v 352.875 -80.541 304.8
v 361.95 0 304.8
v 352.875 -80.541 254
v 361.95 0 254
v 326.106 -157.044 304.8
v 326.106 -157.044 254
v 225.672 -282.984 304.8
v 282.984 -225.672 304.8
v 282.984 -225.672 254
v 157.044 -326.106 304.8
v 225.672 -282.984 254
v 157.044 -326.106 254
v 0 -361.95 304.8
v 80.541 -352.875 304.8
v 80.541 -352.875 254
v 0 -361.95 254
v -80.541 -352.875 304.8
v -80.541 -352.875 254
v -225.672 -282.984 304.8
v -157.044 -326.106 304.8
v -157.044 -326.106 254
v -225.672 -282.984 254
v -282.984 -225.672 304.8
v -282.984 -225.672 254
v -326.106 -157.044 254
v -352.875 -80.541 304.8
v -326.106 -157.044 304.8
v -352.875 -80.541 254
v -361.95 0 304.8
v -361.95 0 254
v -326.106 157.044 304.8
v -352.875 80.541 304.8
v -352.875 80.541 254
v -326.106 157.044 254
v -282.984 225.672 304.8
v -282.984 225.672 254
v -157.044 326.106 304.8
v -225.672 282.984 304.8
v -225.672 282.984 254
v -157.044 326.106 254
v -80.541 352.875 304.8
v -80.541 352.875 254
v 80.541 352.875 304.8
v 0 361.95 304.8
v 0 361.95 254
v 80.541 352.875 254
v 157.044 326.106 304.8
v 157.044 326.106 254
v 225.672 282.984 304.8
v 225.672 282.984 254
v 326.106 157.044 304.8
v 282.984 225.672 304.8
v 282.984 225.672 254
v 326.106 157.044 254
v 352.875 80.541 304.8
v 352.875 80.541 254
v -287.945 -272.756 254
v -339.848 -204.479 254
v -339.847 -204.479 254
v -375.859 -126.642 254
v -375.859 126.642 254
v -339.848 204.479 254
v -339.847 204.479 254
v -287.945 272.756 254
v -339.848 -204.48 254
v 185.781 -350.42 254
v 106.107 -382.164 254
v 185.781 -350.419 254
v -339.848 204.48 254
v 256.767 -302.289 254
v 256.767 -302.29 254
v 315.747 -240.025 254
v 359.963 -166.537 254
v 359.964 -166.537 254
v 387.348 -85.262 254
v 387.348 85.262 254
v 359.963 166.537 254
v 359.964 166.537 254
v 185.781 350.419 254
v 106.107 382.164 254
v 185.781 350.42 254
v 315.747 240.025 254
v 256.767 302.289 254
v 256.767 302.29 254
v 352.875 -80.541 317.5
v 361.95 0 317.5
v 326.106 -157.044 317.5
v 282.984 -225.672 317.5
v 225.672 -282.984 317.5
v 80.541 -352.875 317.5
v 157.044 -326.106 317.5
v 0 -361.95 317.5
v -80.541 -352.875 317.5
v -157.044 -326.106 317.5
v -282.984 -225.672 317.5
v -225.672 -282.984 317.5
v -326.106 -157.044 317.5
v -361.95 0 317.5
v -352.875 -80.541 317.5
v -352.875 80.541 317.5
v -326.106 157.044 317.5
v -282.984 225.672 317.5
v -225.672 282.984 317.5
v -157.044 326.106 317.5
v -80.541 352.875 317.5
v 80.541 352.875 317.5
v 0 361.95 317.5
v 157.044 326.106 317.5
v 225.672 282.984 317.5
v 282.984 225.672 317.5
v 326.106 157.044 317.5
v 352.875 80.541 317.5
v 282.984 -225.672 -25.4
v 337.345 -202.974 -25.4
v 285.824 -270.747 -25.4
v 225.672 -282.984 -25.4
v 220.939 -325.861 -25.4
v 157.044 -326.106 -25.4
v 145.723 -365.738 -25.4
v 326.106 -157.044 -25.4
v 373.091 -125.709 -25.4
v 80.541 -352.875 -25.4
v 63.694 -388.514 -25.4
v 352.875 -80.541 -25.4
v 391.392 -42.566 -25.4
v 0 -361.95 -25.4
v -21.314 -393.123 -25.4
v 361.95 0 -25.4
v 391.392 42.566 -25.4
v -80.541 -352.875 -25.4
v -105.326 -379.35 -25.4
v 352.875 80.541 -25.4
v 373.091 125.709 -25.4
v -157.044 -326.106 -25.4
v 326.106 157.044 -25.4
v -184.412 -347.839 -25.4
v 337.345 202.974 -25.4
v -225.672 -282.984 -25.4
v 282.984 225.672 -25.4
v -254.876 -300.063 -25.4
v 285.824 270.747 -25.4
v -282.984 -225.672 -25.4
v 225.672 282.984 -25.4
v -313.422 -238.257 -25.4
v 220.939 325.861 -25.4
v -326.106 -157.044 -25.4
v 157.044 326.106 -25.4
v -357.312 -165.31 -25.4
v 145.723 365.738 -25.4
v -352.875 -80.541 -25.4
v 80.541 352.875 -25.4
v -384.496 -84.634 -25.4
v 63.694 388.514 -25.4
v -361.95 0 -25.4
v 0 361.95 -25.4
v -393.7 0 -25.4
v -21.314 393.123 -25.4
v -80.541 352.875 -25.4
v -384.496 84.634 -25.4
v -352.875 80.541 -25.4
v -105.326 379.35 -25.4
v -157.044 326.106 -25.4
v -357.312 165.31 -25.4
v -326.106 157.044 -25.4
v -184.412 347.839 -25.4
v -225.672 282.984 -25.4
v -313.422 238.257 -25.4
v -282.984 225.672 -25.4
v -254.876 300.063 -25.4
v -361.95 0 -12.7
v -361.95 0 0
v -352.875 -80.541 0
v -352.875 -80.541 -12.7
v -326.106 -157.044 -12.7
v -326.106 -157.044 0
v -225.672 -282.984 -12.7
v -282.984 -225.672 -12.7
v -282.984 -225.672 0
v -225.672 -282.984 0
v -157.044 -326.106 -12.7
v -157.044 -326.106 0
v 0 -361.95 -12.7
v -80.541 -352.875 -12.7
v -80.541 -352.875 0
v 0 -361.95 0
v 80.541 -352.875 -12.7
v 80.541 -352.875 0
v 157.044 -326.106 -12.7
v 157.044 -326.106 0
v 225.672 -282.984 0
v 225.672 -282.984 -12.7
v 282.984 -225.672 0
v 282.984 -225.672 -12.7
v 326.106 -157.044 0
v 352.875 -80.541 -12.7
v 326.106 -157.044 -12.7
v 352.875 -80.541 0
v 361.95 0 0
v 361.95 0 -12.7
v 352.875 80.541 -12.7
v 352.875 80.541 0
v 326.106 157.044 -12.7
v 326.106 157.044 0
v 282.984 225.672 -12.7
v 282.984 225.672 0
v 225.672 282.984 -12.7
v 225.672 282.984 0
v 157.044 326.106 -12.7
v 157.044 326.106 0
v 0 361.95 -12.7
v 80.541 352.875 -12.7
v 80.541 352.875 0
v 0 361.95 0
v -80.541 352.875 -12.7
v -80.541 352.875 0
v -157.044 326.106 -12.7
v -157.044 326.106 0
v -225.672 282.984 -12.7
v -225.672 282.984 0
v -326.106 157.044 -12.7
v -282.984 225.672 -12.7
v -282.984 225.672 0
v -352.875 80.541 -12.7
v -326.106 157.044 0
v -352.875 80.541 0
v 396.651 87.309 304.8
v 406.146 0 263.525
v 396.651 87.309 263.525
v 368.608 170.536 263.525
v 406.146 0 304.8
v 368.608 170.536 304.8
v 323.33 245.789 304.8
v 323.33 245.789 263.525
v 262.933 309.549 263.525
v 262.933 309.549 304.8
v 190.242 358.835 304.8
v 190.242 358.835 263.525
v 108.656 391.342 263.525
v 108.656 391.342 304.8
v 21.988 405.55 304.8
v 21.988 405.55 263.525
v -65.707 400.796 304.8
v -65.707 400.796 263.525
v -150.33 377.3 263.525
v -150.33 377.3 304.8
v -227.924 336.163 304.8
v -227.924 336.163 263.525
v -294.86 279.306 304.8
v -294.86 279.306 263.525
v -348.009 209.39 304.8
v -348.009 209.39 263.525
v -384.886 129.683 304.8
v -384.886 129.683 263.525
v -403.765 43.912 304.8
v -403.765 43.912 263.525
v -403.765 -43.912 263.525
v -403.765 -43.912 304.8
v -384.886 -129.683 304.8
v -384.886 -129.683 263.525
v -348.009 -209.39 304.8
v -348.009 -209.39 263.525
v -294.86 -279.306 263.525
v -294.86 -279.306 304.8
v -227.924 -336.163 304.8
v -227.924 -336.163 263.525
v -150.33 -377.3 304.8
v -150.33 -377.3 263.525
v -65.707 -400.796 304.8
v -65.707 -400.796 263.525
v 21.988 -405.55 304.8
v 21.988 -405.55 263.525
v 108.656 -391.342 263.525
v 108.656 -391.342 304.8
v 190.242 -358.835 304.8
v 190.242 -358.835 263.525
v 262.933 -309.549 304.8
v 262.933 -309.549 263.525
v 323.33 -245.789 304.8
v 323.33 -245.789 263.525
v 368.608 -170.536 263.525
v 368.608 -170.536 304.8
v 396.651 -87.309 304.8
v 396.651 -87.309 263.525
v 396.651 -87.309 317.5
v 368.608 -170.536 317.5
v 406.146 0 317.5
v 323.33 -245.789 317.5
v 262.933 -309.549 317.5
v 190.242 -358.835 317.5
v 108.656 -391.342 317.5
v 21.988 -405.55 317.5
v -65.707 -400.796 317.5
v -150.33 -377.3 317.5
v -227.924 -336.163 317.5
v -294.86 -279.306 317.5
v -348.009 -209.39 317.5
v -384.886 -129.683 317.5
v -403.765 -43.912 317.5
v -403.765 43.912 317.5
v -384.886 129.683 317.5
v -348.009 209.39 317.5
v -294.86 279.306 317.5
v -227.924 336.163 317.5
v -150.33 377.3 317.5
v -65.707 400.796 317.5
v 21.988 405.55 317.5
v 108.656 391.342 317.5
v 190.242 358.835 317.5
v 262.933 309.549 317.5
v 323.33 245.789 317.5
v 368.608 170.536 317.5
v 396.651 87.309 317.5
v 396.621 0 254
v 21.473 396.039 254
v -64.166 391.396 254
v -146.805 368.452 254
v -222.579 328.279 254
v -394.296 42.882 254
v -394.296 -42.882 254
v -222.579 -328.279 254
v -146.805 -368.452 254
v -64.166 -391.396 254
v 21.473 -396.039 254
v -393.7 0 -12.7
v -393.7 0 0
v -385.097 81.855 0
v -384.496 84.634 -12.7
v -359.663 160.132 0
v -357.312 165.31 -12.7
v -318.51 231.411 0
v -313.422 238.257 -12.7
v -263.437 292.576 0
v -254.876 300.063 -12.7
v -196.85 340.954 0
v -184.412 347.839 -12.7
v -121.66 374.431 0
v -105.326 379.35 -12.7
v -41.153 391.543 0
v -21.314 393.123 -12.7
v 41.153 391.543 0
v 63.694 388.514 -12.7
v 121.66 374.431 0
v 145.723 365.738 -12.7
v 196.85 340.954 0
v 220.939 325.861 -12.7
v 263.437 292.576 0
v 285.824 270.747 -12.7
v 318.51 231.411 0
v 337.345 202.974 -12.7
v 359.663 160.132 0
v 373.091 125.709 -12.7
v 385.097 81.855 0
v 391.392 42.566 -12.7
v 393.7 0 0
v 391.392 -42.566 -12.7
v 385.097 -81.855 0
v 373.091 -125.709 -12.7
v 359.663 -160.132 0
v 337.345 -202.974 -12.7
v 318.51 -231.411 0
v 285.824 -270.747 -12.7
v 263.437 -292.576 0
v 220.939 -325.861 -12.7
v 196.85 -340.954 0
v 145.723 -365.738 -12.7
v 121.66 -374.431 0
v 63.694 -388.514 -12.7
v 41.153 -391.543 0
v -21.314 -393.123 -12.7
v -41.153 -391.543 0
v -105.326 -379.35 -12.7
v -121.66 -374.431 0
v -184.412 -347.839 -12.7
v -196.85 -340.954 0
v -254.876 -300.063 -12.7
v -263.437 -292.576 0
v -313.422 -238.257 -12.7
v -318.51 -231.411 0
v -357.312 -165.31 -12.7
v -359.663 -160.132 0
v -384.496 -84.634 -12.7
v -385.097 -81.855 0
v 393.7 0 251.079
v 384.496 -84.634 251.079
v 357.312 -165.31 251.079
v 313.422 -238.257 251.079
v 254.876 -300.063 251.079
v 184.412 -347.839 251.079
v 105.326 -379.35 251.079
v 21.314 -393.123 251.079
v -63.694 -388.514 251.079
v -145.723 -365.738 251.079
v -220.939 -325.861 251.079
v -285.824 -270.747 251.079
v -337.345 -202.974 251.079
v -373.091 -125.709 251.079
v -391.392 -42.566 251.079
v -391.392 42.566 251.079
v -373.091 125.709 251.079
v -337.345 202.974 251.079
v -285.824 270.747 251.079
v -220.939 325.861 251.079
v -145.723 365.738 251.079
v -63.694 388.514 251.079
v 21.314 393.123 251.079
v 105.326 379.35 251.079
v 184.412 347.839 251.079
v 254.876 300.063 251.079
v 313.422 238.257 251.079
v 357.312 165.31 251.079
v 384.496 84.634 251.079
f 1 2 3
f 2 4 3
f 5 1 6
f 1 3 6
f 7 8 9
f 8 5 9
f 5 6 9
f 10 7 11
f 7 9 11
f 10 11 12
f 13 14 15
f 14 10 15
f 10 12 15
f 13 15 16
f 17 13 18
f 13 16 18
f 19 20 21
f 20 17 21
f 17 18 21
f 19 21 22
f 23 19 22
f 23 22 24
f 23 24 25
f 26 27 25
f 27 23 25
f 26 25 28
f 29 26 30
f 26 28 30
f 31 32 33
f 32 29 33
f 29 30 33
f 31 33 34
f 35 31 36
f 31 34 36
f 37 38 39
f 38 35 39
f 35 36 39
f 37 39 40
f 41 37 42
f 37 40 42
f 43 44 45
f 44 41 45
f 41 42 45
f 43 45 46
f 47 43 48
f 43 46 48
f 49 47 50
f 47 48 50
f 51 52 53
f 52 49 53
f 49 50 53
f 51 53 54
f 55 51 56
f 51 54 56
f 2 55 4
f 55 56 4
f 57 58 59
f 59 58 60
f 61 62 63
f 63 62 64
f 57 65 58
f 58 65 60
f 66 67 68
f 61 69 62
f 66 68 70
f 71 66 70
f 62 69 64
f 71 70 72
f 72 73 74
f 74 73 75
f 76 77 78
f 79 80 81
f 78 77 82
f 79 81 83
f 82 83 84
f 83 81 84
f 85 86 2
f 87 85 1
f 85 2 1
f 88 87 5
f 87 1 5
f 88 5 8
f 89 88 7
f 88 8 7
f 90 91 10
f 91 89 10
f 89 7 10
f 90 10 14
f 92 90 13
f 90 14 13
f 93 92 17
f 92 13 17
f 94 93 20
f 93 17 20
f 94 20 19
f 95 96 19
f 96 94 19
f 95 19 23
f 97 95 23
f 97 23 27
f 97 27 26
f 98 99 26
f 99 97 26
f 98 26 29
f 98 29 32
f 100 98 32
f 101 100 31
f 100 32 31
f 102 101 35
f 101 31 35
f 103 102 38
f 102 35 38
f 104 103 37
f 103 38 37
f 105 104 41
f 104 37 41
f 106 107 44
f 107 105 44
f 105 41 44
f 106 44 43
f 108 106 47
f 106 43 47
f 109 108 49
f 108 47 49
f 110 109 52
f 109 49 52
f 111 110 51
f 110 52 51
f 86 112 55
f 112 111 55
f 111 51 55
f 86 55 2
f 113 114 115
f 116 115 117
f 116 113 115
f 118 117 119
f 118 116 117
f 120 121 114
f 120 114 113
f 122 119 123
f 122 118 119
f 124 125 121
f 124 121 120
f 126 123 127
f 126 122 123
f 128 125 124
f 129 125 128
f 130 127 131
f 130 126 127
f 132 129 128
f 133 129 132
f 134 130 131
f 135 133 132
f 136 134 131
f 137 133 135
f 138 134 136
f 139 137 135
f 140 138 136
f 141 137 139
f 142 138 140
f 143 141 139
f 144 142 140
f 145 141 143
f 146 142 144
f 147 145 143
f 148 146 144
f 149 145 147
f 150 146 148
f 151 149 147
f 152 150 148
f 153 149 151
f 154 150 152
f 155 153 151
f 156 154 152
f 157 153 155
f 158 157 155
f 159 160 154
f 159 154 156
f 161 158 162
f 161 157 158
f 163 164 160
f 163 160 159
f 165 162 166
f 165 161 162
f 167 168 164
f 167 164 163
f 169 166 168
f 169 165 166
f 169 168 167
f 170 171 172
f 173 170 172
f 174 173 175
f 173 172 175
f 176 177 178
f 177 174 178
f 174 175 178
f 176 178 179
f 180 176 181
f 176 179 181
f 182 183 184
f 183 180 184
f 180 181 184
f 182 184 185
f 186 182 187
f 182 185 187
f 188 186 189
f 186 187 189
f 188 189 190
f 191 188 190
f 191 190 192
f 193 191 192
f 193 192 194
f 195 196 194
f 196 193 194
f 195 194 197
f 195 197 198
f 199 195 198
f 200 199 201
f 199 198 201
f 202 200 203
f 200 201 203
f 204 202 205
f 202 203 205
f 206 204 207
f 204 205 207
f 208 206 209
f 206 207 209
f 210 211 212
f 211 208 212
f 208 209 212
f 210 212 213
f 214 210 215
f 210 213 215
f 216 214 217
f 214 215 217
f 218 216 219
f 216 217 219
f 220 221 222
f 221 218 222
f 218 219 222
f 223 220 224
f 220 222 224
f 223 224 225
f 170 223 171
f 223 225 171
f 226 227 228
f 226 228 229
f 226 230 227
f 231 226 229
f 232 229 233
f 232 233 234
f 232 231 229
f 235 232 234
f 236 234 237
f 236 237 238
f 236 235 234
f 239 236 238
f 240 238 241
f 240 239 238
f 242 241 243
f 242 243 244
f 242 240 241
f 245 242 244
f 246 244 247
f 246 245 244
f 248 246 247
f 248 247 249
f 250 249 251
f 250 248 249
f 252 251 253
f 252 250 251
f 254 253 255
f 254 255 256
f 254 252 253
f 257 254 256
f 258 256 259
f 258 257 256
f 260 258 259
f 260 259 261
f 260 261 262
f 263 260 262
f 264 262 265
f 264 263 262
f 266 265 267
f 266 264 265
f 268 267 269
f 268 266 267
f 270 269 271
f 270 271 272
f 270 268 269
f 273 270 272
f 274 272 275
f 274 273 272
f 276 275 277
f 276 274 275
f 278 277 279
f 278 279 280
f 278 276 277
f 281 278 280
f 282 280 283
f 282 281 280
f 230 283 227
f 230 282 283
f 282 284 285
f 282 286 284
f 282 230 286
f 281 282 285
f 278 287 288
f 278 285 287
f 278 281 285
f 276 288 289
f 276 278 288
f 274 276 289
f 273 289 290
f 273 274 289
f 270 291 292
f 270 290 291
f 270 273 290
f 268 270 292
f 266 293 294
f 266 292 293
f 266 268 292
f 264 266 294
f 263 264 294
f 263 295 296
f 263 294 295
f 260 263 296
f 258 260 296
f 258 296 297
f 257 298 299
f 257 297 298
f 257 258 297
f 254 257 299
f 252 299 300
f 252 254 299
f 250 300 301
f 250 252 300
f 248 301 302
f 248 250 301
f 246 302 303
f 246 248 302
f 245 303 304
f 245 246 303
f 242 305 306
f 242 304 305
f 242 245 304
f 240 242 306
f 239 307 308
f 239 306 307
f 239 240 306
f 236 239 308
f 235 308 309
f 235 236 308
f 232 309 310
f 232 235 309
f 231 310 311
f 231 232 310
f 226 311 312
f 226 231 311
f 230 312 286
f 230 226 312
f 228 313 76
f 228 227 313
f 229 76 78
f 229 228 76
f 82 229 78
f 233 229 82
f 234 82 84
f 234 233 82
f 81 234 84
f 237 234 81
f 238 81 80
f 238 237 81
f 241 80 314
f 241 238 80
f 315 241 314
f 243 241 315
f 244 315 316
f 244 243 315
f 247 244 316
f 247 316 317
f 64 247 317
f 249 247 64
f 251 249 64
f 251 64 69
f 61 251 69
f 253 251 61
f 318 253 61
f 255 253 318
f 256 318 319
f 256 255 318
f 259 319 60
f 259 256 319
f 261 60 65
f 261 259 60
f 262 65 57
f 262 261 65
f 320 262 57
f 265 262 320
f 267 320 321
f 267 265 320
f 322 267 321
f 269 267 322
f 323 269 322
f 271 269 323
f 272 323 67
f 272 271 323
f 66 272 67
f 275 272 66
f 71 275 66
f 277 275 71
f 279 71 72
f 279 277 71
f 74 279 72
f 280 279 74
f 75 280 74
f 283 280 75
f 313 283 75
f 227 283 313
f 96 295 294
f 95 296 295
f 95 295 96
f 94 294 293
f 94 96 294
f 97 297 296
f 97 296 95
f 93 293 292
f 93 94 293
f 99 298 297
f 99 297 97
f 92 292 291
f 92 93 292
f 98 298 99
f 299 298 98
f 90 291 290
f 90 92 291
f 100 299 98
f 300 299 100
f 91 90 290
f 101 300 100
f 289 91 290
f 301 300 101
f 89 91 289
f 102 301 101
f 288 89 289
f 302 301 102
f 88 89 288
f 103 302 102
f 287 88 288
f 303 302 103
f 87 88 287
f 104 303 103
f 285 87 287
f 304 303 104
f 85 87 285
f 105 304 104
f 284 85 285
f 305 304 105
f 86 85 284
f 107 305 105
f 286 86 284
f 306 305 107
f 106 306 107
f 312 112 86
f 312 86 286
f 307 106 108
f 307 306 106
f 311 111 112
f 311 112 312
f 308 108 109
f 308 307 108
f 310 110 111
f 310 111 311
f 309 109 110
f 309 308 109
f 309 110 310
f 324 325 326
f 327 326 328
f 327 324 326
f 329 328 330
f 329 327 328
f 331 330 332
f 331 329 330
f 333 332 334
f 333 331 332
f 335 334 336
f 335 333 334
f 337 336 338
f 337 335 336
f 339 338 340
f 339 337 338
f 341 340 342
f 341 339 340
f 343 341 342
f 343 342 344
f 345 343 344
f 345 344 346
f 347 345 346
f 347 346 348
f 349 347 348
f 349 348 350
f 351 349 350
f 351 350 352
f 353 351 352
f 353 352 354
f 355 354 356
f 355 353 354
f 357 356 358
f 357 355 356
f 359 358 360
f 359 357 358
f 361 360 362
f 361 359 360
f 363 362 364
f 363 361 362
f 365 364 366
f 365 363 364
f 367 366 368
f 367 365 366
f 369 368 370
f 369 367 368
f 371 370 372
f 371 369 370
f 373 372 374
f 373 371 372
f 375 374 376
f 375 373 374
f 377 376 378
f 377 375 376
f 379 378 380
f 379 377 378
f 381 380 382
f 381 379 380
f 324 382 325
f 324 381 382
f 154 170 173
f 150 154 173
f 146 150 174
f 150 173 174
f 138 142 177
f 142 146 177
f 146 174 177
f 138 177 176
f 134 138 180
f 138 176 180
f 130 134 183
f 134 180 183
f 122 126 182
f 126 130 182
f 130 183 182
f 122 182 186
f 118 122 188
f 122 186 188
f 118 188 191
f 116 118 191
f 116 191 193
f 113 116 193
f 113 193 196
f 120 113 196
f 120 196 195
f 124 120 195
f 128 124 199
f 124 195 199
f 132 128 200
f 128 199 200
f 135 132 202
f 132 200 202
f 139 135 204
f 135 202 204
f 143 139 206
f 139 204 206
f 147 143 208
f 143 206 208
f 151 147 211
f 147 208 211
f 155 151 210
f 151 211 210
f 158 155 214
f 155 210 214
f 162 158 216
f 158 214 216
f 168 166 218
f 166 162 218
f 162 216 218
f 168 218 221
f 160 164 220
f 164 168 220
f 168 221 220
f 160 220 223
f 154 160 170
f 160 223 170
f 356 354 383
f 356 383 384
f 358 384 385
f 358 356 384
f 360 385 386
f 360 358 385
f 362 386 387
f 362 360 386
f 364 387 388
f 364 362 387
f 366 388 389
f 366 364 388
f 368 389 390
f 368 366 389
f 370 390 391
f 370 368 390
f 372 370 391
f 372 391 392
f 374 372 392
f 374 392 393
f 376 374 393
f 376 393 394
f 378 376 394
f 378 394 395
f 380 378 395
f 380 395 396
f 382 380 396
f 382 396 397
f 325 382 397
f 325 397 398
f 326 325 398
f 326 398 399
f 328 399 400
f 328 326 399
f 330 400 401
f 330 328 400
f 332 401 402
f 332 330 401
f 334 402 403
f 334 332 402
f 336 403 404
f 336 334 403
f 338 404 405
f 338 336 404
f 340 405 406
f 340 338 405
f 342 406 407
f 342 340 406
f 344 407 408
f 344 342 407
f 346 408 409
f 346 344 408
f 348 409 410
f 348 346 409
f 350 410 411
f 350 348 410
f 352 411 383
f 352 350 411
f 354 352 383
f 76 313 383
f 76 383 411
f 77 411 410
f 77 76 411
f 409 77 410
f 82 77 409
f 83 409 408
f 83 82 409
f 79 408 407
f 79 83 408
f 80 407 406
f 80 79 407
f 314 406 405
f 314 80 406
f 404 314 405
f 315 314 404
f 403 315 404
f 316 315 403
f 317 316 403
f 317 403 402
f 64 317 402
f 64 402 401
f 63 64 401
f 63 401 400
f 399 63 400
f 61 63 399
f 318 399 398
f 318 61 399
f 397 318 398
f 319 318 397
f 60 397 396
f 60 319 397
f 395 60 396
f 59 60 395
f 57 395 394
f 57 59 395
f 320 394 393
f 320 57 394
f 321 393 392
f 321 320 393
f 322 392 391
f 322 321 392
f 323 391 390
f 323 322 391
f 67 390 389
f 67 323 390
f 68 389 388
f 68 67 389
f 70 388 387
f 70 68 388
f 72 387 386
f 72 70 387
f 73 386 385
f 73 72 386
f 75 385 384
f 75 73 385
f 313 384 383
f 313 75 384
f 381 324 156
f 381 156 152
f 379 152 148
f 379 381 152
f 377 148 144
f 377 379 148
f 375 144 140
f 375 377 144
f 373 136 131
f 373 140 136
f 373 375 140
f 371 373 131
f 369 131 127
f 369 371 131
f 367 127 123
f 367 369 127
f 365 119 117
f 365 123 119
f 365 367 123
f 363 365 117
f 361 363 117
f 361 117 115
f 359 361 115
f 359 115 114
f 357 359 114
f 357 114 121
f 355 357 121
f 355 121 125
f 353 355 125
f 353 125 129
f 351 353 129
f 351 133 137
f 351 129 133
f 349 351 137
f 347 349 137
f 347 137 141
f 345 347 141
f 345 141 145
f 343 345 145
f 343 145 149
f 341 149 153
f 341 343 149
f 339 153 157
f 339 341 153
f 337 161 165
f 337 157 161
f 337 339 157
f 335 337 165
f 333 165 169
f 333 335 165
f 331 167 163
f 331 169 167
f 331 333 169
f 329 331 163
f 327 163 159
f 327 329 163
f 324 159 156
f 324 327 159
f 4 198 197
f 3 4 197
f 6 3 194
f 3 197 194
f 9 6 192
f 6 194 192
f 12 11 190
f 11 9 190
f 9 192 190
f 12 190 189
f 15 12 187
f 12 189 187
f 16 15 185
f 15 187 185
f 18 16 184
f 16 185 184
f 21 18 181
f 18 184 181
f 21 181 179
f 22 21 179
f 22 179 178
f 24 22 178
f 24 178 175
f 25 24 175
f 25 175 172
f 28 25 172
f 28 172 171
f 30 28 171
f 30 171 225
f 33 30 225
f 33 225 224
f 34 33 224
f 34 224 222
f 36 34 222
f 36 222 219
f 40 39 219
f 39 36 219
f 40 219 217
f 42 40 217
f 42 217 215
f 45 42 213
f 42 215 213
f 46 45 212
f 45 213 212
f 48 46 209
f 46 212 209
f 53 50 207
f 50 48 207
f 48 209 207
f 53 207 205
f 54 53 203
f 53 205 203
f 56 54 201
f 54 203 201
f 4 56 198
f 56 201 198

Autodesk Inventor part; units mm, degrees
ref_plane "YZ Plane" through (0, 0, 0) normal (1, 0, 0) x (0, 1, 0)
ref_plane "XZ Plane" through (0, 0, 0) normal (0, 1, 0) x (-1, 0, 0)
ref_plane "XY Plane" through (0, 0, 0) normal (0, 0, 1) x (1, 0, 0)
sketch "Sketch1" plane through (0, 0, 0) normal (0, 0, 1) x (1, 0, 0)
  circle A0 centre (0, 0) radius 361.95
  circle A1 centre (0, 0) radius 393.7
  dimension "d0" = 723.9
  dimension "d1" = 787.4
extrude "Extrusion1" add sketch "Sketch1" along normal blind 304.8
sketch "Sketch2" plane through (0, 0, 304.8) normal (0, 0, 1) x (1, 0, 0)
  circle A0 centre (0, 0) radius 393.7 projected
  circle A1 centre (0, 0) radius 396.621
  circle A2 centre (0, 0) radius 399.796
  dimension "d4" = 793.242
  dimension "d5" = 799.592
extrude "Extrusion2" add sketch "Sketch2" against normal blind 50.8 contours A1
extrude "Extrusion3" add sketch "Sketch2" against normal blind 25.4 contours A2
chamfer "Chamfer1" distance 2.921 angle 45 1 edges at (-393.7, 0, 254)
sketch "Sketch3" plane through (0, 0, 0) normal (0, 0, -1) x (-1, 0, 0)
  circle A0 centre (0, 0) radius 380.746
  circle A1 centre (0, 0) radius 361.95 projected
  dimension "d13" = 761.492
extrude "Extrusion4" add sketch "Sketch3" along normal blind 12.7
fillet "Fillet1" radius 0.7937 2 edges at (380.746, 0, 0) (-396.621, 0, 279.4)
chamfer "Chamfer2" distance 0.7937 angle 45 1 edges at (380.746, 0, -12.7)
chamfer "Chamfer3" distance 0.7937 angle 45 1 edges at (-399.796, 0, 279.4)
sketch "Sketch4" plane through (0, 0, 0) normal (1, 0, 0) x (0, 1, 0)
  line L0 (396.621, 278.6062) -> (396.621, 254) construction
  line L1 (-399.796, 304.8) -> (399.796, 304.8) construction
  line L2 (396.621, 273.05) -> (394.8409, 271.2699)
  arc A0 (394.8409, 271.2699) -> (393.446, 267.9023) centre (398.2085, 267.9023) ccw
  line L3 (393.446, 267.9023) -> (393.446, 267.0852)
  arc A1 (393.446, 267.0852) -> (394.8409, 263.7176) centre (398.2085, 267.0852) ccw
  line L4 (394.8409, 263.7176) -> (396.621, 261.9375)
  line L5 (396.621, 261.9375) -> (396.621, 273.05)
  line L6 (0, -60.96) -> (0, 365.76) projected
  point P0 (0, 0)
  dimension "d23" = 11.1125
  dimension "d24" = 3.175
  dimension "d25" = 4.7625
  dimension "d26" = 31.75
  dimension "d27" = 45
revolve "Revolution1" cut sketch "Sketch4" angle 360 about axis through (0, 0, -10) along (0, 0, 1)
sketch "Sketch7" plane through (0, 0, -12.7) normal (0, 0, -1) x (-1, 0, 0)
  circle A0 centre (0, 0) radius 361.95 projected
  circle A1 centre (0, 0) radius 393.7 projected
extrude "Extrusion7" add sketch "Sketch7" along normal mid plane 25.4
sketch "Sketch8" plane through (0, 0, 304.8) normal (0, 0, 1) x (1, 0, 0)
  circle A0 centre (0, 0) radius 399.796 projected
  circle A1 centre (0, 0) radius 361.95 projected
  circle A2 centre (0, 0) radius 406.146
  dimension "d43" = 6.35
extrude "Extrusion8" add sketch "Sketch8" along normal blind 12.7 and the other way blind 50.8 contours A0 | A2
chamfer "Chamfer4" distance 9.525 angle 45 1 edges at (-406.146, 0, 254)
equation "\"d10\" = -0.5 * d1 + 0.5 * d4"
properties part number "A1-19037-200-06 HCWI liner - pup - as cast" material "Iron, HCWI"
